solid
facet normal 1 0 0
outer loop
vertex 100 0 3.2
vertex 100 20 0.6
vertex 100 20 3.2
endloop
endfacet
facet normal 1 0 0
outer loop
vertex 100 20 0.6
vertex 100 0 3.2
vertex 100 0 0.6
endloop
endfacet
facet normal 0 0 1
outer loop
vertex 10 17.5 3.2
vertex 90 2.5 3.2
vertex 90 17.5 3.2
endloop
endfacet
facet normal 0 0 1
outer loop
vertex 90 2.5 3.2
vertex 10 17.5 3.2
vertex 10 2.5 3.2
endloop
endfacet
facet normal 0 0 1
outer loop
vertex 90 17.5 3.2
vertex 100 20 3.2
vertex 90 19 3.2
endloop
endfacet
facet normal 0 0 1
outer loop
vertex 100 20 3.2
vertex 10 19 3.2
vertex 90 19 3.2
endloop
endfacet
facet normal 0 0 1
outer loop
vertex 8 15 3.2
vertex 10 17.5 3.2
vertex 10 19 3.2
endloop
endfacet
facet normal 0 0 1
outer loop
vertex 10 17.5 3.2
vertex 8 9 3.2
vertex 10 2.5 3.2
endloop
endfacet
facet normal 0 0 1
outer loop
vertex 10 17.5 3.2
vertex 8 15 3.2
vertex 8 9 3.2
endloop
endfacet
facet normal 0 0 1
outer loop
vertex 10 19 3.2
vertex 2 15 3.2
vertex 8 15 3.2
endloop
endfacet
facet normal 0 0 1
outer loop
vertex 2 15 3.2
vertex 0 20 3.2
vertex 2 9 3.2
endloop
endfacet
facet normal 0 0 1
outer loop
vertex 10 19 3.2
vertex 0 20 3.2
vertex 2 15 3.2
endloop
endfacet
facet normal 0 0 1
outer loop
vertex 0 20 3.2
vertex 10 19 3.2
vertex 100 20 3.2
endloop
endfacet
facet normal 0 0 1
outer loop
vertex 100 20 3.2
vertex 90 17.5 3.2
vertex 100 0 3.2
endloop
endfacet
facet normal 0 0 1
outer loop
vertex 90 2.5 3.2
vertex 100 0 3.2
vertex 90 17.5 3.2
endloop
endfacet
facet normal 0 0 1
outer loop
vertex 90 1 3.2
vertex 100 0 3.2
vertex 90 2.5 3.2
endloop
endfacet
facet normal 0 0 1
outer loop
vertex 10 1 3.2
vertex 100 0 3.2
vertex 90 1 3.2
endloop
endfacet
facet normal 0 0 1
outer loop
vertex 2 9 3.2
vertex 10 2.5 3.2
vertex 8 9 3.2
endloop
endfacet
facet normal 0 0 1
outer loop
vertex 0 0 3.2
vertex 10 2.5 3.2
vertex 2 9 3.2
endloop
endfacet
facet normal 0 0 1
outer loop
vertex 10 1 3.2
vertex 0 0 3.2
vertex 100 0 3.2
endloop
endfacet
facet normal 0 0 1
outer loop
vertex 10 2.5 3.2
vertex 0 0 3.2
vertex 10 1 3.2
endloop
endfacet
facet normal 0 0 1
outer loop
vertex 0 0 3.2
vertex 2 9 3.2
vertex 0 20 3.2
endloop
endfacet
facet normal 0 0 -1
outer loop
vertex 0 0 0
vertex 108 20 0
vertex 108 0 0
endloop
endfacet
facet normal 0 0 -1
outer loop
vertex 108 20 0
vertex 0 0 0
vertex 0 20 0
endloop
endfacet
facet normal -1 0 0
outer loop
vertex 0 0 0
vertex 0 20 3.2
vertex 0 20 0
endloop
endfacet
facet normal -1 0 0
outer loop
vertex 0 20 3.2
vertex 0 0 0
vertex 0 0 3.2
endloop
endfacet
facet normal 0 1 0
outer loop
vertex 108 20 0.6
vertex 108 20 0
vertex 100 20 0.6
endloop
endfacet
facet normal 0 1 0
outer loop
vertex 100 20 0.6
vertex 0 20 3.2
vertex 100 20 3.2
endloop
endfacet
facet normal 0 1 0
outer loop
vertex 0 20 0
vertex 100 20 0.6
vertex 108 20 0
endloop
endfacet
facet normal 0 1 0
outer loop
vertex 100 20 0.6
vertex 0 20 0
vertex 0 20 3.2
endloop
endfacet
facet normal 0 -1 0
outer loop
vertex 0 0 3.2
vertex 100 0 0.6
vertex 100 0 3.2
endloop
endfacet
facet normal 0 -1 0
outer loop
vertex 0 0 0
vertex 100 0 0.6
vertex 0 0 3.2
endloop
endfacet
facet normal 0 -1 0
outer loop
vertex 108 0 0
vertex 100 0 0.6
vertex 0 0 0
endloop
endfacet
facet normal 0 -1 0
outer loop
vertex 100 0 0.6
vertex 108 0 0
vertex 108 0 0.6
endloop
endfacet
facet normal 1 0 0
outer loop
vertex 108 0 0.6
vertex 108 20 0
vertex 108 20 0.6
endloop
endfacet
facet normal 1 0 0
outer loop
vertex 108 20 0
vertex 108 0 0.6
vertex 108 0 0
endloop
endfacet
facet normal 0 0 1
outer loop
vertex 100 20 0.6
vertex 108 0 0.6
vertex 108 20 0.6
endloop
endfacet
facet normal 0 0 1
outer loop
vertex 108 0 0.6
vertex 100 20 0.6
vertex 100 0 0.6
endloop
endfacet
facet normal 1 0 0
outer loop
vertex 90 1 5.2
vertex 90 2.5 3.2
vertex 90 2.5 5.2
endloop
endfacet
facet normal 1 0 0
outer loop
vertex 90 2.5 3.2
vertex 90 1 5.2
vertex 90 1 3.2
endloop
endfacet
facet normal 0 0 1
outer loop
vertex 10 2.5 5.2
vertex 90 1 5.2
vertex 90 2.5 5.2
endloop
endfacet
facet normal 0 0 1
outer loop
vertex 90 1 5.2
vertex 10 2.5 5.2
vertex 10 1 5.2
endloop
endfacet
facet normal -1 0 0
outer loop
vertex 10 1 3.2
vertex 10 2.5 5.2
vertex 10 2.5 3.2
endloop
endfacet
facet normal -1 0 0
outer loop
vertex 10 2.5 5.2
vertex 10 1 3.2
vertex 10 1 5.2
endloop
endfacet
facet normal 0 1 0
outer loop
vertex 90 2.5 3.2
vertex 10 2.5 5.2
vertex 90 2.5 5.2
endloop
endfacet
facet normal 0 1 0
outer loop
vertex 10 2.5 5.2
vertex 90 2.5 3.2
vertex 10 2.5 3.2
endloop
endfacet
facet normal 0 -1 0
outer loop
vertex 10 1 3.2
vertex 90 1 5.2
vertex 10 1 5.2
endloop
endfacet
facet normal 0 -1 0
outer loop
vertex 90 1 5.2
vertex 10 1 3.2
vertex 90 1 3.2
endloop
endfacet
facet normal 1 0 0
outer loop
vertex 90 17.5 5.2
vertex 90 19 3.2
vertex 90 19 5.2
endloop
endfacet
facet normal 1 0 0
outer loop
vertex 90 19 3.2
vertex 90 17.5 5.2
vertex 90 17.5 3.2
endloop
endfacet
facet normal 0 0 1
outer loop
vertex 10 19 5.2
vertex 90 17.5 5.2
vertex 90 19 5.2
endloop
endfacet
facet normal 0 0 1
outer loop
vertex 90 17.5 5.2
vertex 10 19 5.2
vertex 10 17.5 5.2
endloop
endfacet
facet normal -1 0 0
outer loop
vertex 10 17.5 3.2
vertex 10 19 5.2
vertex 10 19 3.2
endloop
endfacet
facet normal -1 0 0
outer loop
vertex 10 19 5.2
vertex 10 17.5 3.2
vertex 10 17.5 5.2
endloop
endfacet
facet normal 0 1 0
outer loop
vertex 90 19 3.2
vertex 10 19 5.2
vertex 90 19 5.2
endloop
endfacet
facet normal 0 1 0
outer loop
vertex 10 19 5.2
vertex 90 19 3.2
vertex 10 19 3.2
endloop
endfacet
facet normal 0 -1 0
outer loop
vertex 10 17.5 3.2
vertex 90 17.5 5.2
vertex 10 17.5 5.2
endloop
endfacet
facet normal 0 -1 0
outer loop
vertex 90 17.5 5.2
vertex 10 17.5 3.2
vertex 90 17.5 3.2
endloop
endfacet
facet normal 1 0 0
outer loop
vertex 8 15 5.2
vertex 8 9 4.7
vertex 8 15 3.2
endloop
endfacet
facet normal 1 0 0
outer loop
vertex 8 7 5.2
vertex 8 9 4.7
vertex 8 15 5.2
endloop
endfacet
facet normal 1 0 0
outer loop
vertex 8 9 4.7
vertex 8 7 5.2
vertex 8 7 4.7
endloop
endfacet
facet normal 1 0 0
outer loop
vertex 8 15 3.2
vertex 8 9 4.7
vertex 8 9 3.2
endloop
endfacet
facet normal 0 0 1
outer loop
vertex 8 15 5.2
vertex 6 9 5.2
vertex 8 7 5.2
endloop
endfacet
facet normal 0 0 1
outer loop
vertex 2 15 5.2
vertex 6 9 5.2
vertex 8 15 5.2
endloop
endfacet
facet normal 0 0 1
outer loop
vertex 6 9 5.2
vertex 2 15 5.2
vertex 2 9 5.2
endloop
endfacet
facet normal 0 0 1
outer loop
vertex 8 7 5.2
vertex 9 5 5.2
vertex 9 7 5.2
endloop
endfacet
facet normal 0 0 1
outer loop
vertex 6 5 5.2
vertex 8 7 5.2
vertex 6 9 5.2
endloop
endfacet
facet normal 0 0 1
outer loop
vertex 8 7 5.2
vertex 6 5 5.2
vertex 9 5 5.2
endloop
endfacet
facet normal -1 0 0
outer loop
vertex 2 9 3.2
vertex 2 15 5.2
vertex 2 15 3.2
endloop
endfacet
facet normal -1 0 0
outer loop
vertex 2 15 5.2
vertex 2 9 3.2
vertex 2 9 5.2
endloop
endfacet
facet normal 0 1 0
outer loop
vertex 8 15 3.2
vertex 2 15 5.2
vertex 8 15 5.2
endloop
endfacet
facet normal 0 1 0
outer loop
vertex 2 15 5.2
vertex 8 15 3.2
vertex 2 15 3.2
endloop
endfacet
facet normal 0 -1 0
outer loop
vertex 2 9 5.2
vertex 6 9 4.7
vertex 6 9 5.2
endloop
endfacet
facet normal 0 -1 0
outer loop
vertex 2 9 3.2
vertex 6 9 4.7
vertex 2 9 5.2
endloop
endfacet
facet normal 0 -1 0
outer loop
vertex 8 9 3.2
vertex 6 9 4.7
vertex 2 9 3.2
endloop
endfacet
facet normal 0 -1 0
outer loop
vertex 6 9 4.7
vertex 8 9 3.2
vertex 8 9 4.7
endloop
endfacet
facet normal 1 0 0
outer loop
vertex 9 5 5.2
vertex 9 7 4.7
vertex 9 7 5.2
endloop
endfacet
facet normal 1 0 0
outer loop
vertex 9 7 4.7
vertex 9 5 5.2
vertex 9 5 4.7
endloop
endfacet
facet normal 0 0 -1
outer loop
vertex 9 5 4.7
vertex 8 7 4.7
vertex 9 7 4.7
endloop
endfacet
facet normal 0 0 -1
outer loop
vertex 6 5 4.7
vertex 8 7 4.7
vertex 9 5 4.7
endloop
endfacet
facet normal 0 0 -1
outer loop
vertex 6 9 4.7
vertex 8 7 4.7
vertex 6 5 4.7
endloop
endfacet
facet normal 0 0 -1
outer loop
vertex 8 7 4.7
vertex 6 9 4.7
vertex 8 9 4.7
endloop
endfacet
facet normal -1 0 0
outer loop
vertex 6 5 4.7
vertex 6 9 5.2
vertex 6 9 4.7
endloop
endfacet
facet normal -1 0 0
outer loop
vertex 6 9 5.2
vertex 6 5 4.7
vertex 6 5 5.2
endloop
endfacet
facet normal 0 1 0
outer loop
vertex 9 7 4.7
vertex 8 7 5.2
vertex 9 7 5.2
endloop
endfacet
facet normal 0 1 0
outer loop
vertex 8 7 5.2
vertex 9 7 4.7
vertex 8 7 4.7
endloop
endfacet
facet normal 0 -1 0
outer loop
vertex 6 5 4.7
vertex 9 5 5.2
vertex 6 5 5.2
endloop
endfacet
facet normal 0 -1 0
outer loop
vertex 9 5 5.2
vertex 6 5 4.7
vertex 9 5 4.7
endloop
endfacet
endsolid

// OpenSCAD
// Bag clip living hinge, PETG, 0.4 nozzle, no supports.
// Two halves contacting at hinge, open flat print pose.
// Fold: rotate upper 180 about [108,10,5.2] -Y. F(x)=216-x, F(z)=10.4-z.

part = "arm_lower"; // [arm_lower, arm_upper, assembly]
cadverify_only = "";

module instance(name, part, unit = 1) {
    echo(cadverify_instance = [name, part, unit]);
    if (cadverify_only == "" || cadverify_only == name) children();
}

module arm_lower() {
    cube([100, 20, 3.2], false);
    translate([99.9, 0, 0]) cube([8.1, 20, 0.6], false);
    translate([10, 1, 3.1]) cube([80, 1.5, 2.1], false);
    translate([10, 17.5, 3.1]) cube([80, 1.5, 2.1], false);
    // stop tower (central)
    translate([2, 9, 3.1]) cube([6, 6, 2.1], false);
    // lower hook base region uses body; hook lip + bridge
    translate([6, 5, 4.7]) cube([3, 2, 0.5], false);
    translate([6, 6.9, 4.7]) cube([2, 2.2, 0.5], false);
}

module arm_upper() {
    cube([8.1, 20, 0.6], false);
    translate([7.9, 0, 0]) cube([100.1, 20, 3.2], false);
    translate([100, 5, 3.1]) cube([6, 10, 2.1], false);
    translate([97.9, 6, 4.7]) cube([2.5, 8, 0.5], false);
    translate([107.9, 6, 0]) cube([8.1, 8, 3.2], false);
}

if (part == "arm_lower") {
    echo(cadverify_spec = [
        ["bounds", [[0, 0, 0], [108, 20, 5.2]]],
        ["bodies", 1],
        ["through_holes", 0],
        ["support_faces", [["bed", "-z", 1500]]],
        ["overhangs_allowed", [["latch lip", [[5.5, 4.5, 4.5], [9.5, 9.5, 5.5]]]]],
        ["copies", 1],
        ["details", [
            ["arm", "material", [[30, 10, 1.2], [70, 12, 2.0]], 1],
            ["arm_wall", "thickness", [50, 10, 10], [0, 0, -1], 3.2],
            ["hinge", "thickness", [104, 10, 5], [0, 0, -1], 0.6],
            ["rib", "material", [[30, 1.3, 3.8], [70, 2.2, 4.8]], 1],
            ["rib2", "material", [[30, 17.8, 3.8], [70, 18.7, 4.8]], 1],
            ["latch_tower", "material", [[3, 10, 3.8], [7, 14, 5.0]], 1],
            ["latch_lip", "material", [[6.5, 5.5, 4.8], [8.5, 6.5, 5.1]], 1],
            ["bag_slot", "void", [[30, 4, 3.8], [70, 16, 5.0]], 1]
        ]]
    ]);
    arm_lower();
} else if (part == "arm_upper") {
    echo(cadverify_spec = [
        ["bounds", [[0, 0, 0], [116, 20, 6.4]]],
        ["bodies", 1],
        ["through_holes", 0],
        ["support_faces", [["bed", "-z", 1500]]],
        ["overhangs_allowed", [["latch lip", [[98.5, 4.5, 5.6], [102.5, 13.5, 6.6]]]]],
        ["copies", 1],
        ["details", [
            ["arm", "material", [[30, 10, 1.2], [70, 12, 2.0]], 1],
            ["arm_wall", "thickness", [50, 10, 10], [0, 0, -1], 3.2],
            ["hinge", "thickness", [4, 10, 5], [0, 0, -1], 0.6],
            ["latch_tower", "material", [[102.5, 10, 3.8], [105.5, 14, 5.0]], 1],
            ["latch_lip", "material", [[99.5, 5.5, 5.9], [101.5, 6.5, 6.3]], 0.99],
            ["thumb_tab", "material", [[109, 7, 1.2], [114, 13, 2.0]], 0.99],
            ["field", "void", [[30, 4, 3.8], [70, 16, 5.0]], 1]
        ]]
    ]);
    arm_upper();
} else if (part == "assembly") {
    echo(cadverify_spec = [
        ["bounds", [[0, 0, 0], [224.0, 20, 6.4]]],
        ["support_faces", [["bed", "-z", 3000]]],
        ["motions", [
            ["close", ["upper"], "rotate", [108, 10, 5.2], [0, -1, 0], [0, 180],
                ["stops", [180]]
            ]
        ]],
        ["assembly_order", [
            [["lower"], [0, 0, 0]],
            [["upper"], [0, 0, -1]]
        ]]
    ]);
    instance("lower", "arm_lower") arm_lower();
    instance("upper", "arm_upper") translate([108, 0, 0]) arm_upper();
}
